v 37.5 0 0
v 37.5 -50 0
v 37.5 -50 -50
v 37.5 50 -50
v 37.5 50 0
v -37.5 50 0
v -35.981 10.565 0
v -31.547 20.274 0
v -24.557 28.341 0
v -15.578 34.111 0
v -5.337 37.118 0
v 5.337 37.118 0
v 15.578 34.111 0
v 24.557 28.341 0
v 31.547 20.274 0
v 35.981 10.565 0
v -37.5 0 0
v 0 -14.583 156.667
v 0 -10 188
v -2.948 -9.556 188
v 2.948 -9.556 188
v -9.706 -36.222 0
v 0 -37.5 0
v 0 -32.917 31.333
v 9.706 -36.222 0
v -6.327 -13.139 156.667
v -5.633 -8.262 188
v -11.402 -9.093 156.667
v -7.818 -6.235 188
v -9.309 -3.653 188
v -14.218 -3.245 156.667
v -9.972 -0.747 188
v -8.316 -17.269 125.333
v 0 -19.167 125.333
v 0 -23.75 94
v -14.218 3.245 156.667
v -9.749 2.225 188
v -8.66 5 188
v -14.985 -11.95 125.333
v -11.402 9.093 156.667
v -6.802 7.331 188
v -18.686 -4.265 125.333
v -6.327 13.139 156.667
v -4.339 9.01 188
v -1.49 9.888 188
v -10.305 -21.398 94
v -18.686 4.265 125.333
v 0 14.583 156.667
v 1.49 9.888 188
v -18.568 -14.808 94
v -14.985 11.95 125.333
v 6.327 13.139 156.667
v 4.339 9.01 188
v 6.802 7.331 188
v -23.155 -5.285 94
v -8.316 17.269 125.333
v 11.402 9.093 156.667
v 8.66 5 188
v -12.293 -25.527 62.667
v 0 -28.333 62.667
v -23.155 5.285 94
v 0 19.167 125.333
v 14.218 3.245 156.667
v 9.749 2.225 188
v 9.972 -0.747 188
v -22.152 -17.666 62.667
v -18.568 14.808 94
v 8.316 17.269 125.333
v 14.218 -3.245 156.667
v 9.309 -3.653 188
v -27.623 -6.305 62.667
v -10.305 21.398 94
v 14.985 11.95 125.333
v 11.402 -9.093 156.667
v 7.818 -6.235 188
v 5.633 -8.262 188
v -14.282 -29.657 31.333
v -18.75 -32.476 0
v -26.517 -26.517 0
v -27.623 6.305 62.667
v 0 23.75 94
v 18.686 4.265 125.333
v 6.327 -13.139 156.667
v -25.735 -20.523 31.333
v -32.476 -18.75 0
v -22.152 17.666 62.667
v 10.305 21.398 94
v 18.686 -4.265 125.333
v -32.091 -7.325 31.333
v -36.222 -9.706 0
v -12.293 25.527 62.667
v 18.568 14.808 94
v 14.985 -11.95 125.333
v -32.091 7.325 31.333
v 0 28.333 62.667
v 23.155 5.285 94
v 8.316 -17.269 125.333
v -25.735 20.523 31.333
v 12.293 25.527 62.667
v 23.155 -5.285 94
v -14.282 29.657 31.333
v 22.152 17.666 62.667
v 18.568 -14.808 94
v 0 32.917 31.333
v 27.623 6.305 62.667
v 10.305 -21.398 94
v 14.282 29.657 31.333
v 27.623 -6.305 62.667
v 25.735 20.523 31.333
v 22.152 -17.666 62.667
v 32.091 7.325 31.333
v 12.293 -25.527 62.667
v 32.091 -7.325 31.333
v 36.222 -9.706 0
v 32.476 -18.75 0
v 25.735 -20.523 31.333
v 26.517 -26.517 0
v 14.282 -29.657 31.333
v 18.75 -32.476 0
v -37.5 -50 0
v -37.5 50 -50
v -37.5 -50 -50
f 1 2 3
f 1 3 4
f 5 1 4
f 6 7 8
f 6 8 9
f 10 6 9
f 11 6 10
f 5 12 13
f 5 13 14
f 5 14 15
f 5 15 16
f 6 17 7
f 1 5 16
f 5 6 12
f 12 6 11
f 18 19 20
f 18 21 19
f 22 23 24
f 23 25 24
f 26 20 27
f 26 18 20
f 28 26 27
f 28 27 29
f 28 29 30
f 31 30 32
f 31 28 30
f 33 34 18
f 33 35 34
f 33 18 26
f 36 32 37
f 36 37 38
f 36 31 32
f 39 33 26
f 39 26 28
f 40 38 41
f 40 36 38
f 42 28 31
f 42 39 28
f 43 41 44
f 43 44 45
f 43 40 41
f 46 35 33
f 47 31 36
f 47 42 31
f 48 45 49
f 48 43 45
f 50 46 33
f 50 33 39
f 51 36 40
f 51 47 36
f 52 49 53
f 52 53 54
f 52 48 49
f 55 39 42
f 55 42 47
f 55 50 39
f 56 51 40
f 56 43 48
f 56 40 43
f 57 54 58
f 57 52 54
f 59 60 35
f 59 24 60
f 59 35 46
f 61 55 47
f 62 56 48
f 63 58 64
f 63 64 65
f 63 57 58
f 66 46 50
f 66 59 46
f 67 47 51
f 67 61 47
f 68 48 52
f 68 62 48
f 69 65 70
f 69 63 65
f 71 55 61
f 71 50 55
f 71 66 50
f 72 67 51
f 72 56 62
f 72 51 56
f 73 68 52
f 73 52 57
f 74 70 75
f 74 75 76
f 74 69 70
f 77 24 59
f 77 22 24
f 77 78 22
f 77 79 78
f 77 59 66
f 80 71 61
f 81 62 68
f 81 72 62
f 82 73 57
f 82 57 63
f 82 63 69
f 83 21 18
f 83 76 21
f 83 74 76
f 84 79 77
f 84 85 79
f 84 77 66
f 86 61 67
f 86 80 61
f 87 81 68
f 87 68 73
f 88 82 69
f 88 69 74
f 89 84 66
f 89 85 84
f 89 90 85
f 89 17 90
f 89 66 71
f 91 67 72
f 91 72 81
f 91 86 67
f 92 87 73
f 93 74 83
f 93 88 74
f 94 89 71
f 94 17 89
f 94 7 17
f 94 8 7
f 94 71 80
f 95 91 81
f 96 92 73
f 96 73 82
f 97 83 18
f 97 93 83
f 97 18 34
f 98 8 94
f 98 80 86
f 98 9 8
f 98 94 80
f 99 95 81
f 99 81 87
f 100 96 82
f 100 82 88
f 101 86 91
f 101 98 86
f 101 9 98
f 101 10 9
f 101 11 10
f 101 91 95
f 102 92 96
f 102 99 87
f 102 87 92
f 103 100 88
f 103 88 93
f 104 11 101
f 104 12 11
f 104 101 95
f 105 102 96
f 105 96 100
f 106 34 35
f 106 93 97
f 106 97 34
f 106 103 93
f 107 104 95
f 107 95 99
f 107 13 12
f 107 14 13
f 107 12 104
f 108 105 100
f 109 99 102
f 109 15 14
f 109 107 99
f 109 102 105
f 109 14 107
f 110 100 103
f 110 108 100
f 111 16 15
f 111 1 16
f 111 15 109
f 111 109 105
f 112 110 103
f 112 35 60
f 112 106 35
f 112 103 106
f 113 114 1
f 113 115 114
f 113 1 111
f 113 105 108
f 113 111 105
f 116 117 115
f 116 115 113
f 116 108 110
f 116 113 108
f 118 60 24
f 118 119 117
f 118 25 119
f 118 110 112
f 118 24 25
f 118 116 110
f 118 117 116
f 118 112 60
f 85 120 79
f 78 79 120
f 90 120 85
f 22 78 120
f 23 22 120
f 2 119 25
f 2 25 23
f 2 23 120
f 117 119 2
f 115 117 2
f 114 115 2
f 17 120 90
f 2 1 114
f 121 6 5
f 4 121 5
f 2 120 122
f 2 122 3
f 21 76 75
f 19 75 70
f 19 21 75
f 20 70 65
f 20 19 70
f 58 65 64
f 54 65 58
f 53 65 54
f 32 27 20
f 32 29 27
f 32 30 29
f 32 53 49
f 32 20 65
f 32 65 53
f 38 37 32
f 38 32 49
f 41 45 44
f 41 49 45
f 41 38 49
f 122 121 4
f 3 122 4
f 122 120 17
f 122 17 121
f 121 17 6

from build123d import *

# Parameters (mm, degrees)
F0_W     = 75
F0_H     = 100
F1_DEPTH = 50


with BuildPart() as f1:
    # F0 (on Top) → F1 (new body)
    with BuildSketch(Plane.XY):
        Rectangle(F0_W, F0_H)
    extrude(amount=-F1_DEPTH)

    # F2 (on Right) → F3 (revolve)
    with BuildSketch(Plane.YZ):
        Polygon((0, 0), (0, 188), (-10, 188), (-37.5, 0), align=None)
    revolve(axis=Axis((0, 0, 94), (0, 0, -1)))


solid = f1.part
